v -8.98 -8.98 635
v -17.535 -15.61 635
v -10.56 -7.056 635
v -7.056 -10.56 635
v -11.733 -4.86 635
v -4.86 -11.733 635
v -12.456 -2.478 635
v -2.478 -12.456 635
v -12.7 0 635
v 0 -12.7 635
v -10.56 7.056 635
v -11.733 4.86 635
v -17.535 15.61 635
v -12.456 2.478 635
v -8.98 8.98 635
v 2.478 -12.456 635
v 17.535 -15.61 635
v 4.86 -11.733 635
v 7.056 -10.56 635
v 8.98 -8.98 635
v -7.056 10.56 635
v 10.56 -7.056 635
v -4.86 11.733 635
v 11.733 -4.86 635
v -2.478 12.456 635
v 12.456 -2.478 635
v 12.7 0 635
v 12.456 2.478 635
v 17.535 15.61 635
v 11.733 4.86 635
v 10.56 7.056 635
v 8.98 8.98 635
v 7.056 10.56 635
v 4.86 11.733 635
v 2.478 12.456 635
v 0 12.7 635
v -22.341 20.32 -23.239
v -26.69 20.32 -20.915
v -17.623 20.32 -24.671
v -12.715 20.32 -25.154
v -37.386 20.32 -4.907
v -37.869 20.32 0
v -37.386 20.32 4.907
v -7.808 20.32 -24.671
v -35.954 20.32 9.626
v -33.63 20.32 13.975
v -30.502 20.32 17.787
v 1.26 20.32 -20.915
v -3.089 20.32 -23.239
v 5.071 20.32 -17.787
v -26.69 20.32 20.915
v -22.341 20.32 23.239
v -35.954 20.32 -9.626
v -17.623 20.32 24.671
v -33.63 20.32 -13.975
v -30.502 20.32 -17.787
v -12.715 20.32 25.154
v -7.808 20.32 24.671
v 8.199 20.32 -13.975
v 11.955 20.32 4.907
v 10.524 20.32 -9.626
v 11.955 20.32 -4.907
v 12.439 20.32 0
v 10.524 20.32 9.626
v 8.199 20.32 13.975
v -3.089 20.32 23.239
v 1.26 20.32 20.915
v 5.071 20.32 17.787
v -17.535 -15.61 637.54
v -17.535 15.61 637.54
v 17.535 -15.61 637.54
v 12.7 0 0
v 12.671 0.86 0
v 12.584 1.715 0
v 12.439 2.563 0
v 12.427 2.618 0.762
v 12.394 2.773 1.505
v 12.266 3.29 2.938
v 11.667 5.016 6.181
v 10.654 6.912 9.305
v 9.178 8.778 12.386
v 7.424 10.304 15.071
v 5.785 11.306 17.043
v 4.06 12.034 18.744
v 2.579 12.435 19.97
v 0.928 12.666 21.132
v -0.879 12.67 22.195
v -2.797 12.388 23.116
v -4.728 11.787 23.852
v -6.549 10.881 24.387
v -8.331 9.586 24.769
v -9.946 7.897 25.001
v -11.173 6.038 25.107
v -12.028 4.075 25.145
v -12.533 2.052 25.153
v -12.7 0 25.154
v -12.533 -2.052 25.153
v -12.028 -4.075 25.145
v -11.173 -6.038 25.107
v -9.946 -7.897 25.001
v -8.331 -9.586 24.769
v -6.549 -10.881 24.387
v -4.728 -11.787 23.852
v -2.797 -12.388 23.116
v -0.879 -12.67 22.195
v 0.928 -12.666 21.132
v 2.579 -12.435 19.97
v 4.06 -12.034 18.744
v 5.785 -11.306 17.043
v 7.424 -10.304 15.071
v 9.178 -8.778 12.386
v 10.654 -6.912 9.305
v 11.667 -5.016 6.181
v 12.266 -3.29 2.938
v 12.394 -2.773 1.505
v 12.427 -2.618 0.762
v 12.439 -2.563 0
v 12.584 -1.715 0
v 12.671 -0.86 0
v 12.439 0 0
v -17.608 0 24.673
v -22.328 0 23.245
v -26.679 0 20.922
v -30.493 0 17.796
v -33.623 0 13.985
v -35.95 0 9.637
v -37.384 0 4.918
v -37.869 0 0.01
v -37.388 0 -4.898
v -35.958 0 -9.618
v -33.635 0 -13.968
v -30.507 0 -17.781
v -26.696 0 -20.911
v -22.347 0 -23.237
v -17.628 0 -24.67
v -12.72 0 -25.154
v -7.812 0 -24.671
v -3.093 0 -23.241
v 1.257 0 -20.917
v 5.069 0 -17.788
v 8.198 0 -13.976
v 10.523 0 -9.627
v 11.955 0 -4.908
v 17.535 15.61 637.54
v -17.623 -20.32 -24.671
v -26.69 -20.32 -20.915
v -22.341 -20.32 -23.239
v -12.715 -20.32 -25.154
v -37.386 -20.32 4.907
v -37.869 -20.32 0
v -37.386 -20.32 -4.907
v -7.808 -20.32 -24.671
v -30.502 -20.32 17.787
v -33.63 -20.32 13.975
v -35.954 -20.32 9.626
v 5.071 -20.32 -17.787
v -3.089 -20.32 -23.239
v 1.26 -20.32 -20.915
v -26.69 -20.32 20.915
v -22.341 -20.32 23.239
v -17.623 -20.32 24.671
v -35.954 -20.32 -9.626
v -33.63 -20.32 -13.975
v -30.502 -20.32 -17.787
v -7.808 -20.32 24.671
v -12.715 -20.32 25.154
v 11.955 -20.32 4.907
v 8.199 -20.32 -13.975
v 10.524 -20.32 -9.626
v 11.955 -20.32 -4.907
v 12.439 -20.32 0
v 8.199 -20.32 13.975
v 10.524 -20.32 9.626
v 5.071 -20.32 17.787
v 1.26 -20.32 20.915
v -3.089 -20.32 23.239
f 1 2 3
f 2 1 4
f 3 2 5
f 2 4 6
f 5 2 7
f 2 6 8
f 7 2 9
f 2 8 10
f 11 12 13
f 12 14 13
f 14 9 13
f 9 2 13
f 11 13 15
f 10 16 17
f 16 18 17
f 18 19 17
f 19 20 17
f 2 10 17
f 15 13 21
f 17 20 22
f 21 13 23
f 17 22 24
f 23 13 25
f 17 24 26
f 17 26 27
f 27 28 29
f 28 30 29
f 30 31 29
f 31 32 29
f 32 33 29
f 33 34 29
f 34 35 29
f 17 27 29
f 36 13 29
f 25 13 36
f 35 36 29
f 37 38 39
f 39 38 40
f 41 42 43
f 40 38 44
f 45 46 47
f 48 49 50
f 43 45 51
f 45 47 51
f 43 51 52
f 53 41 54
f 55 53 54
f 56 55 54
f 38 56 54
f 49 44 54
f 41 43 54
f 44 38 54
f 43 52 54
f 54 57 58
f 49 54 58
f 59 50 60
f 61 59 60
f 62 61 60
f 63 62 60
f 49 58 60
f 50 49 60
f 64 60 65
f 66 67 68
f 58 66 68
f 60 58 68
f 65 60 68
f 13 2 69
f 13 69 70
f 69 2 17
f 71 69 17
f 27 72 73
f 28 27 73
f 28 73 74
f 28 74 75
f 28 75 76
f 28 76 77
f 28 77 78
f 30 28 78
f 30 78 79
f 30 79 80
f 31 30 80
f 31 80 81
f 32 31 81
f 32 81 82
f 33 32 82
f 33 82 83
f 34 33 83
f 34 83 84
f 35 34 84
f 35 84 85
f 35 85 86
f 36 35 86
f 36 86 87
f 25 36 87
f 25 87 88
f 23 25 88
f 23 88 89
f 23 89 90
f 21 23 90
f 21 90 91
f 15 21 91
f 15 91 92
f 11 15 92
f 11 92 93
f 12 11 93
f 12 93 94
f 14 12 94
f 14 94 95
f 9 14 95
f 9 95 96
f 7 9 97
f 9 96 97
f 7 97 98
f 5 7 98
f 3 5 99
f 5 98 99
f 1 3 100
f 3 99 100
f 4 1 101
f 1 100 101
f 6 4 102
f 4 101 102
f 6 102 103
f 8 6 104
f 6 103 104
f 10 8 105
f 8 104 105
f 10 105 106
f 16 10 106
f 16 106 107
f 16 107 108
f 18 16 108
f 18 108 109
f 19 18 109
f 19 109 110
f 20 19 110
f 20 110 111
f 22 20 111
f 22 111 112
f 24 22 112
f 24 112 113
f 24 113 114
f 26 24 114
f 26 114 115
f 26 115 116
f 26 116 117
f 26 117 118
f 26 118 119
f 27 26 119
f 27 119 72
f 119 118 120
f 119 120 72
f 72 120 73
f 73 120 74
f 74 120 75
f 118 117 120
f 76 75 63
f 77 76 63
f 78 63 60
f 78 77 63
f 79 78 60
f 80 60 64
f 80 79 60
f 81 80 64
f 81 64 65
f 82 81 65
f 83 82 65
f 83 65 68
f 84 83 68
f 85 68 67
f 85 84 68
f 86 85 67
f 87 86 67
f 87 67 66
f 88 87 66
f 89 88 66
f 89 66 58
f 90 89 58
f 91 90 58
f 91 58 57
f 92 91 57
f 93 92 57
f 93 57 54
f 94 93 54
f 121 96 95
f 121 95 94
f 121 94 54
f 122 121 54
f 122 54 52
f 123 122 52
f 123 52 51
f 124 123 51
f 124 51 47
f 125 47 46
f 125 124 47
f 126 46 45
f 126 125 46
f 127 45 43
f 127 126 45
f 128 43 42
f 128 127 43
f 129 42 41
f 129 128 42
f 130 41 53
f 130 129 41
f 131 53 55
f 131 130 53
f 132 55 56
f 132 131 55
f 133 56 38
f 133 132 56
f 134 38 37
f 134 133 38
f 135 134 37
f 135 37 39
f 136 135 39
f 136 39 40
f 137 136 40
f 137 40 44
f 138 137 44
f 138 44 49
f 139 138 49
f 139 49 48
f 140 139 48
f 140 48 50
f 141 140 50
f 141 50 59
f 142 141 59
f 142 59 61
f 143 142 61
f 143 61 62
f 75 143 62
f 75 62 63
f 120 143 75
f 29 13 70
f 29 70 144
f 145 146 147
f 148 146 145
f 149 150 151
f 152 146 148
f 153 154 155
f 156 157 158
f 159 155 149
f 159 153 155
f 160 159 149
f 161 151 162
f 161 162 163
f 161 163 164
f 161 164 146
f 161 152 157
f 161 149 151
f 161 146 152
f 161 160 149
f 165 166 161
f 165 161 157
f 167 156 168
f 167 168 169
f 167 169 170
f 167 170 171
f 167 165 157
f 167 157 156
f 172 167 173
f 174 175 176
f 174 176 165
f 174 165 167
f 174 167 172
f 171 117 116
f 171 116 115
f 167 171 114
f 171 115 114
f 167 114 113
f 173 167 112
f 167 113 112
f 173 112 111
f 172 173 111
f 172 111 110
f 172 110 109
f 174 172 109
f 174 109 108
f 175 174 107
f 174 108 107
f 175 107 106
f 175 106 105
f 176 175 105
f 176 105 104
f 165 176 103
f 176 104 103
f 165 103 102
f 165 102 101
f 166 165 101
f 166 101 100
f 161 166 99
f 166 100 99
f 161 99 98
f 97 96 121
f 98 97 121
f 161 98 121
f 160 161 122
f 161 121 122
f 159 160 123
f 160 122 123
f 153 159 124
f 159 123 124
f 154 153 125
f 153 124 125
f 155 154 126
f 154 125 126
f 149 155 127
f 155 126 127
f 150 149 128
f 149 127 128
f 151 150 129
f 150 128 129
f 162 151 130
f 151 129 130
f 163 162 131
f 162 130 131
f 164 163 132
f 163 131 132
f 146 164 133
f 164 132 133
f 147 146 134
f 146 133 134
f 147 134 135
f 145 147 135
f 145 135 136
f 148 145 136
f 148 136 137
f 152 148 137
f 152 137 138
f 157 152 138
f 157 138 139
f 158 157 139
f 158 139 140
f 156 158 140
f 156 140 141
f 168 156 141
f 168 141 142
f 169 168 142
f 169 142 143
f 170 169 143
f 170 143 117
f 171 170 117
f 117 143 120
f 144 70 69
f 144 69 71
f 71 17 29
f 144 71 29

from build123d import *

# Parameters (mm, degrees)
F0_R     = 12.7
F1_DEPTH = 635
F2_R     = 25.153949
F3_DEPTH = 20.32
F5_W     = 35.0695
F5_H     = 31.220594
F6_DEPTH = 2.54


with BuildPart() as f1:
    # F0 (on Top) → F1 (new body)
    with BuildSketch(Plane.XY):
        Circle(F0_R)
    extrude(amount=F1_DEPTH)

    # F2 (on Front) → F3 (join)
    with BuildSketch(Plane.XZ):
        with Locations((-12.71527, 0)):
            Circle(F2_R)
    extrude(amount=F3_DEPTH)

    # F4: F1 across plane


with BuildPart() as f1_1:
    add(f1.part)
    add(f1.part.mirror(Plane.XZ))

    # F5 (on face) → F6 (join)
    with BuildSketch(Plane.XY.offset(635)):
        Rectangle(F5_W, F5_H)
    extrude(amount=F6_DEPTH)


solid = f1_1.part
